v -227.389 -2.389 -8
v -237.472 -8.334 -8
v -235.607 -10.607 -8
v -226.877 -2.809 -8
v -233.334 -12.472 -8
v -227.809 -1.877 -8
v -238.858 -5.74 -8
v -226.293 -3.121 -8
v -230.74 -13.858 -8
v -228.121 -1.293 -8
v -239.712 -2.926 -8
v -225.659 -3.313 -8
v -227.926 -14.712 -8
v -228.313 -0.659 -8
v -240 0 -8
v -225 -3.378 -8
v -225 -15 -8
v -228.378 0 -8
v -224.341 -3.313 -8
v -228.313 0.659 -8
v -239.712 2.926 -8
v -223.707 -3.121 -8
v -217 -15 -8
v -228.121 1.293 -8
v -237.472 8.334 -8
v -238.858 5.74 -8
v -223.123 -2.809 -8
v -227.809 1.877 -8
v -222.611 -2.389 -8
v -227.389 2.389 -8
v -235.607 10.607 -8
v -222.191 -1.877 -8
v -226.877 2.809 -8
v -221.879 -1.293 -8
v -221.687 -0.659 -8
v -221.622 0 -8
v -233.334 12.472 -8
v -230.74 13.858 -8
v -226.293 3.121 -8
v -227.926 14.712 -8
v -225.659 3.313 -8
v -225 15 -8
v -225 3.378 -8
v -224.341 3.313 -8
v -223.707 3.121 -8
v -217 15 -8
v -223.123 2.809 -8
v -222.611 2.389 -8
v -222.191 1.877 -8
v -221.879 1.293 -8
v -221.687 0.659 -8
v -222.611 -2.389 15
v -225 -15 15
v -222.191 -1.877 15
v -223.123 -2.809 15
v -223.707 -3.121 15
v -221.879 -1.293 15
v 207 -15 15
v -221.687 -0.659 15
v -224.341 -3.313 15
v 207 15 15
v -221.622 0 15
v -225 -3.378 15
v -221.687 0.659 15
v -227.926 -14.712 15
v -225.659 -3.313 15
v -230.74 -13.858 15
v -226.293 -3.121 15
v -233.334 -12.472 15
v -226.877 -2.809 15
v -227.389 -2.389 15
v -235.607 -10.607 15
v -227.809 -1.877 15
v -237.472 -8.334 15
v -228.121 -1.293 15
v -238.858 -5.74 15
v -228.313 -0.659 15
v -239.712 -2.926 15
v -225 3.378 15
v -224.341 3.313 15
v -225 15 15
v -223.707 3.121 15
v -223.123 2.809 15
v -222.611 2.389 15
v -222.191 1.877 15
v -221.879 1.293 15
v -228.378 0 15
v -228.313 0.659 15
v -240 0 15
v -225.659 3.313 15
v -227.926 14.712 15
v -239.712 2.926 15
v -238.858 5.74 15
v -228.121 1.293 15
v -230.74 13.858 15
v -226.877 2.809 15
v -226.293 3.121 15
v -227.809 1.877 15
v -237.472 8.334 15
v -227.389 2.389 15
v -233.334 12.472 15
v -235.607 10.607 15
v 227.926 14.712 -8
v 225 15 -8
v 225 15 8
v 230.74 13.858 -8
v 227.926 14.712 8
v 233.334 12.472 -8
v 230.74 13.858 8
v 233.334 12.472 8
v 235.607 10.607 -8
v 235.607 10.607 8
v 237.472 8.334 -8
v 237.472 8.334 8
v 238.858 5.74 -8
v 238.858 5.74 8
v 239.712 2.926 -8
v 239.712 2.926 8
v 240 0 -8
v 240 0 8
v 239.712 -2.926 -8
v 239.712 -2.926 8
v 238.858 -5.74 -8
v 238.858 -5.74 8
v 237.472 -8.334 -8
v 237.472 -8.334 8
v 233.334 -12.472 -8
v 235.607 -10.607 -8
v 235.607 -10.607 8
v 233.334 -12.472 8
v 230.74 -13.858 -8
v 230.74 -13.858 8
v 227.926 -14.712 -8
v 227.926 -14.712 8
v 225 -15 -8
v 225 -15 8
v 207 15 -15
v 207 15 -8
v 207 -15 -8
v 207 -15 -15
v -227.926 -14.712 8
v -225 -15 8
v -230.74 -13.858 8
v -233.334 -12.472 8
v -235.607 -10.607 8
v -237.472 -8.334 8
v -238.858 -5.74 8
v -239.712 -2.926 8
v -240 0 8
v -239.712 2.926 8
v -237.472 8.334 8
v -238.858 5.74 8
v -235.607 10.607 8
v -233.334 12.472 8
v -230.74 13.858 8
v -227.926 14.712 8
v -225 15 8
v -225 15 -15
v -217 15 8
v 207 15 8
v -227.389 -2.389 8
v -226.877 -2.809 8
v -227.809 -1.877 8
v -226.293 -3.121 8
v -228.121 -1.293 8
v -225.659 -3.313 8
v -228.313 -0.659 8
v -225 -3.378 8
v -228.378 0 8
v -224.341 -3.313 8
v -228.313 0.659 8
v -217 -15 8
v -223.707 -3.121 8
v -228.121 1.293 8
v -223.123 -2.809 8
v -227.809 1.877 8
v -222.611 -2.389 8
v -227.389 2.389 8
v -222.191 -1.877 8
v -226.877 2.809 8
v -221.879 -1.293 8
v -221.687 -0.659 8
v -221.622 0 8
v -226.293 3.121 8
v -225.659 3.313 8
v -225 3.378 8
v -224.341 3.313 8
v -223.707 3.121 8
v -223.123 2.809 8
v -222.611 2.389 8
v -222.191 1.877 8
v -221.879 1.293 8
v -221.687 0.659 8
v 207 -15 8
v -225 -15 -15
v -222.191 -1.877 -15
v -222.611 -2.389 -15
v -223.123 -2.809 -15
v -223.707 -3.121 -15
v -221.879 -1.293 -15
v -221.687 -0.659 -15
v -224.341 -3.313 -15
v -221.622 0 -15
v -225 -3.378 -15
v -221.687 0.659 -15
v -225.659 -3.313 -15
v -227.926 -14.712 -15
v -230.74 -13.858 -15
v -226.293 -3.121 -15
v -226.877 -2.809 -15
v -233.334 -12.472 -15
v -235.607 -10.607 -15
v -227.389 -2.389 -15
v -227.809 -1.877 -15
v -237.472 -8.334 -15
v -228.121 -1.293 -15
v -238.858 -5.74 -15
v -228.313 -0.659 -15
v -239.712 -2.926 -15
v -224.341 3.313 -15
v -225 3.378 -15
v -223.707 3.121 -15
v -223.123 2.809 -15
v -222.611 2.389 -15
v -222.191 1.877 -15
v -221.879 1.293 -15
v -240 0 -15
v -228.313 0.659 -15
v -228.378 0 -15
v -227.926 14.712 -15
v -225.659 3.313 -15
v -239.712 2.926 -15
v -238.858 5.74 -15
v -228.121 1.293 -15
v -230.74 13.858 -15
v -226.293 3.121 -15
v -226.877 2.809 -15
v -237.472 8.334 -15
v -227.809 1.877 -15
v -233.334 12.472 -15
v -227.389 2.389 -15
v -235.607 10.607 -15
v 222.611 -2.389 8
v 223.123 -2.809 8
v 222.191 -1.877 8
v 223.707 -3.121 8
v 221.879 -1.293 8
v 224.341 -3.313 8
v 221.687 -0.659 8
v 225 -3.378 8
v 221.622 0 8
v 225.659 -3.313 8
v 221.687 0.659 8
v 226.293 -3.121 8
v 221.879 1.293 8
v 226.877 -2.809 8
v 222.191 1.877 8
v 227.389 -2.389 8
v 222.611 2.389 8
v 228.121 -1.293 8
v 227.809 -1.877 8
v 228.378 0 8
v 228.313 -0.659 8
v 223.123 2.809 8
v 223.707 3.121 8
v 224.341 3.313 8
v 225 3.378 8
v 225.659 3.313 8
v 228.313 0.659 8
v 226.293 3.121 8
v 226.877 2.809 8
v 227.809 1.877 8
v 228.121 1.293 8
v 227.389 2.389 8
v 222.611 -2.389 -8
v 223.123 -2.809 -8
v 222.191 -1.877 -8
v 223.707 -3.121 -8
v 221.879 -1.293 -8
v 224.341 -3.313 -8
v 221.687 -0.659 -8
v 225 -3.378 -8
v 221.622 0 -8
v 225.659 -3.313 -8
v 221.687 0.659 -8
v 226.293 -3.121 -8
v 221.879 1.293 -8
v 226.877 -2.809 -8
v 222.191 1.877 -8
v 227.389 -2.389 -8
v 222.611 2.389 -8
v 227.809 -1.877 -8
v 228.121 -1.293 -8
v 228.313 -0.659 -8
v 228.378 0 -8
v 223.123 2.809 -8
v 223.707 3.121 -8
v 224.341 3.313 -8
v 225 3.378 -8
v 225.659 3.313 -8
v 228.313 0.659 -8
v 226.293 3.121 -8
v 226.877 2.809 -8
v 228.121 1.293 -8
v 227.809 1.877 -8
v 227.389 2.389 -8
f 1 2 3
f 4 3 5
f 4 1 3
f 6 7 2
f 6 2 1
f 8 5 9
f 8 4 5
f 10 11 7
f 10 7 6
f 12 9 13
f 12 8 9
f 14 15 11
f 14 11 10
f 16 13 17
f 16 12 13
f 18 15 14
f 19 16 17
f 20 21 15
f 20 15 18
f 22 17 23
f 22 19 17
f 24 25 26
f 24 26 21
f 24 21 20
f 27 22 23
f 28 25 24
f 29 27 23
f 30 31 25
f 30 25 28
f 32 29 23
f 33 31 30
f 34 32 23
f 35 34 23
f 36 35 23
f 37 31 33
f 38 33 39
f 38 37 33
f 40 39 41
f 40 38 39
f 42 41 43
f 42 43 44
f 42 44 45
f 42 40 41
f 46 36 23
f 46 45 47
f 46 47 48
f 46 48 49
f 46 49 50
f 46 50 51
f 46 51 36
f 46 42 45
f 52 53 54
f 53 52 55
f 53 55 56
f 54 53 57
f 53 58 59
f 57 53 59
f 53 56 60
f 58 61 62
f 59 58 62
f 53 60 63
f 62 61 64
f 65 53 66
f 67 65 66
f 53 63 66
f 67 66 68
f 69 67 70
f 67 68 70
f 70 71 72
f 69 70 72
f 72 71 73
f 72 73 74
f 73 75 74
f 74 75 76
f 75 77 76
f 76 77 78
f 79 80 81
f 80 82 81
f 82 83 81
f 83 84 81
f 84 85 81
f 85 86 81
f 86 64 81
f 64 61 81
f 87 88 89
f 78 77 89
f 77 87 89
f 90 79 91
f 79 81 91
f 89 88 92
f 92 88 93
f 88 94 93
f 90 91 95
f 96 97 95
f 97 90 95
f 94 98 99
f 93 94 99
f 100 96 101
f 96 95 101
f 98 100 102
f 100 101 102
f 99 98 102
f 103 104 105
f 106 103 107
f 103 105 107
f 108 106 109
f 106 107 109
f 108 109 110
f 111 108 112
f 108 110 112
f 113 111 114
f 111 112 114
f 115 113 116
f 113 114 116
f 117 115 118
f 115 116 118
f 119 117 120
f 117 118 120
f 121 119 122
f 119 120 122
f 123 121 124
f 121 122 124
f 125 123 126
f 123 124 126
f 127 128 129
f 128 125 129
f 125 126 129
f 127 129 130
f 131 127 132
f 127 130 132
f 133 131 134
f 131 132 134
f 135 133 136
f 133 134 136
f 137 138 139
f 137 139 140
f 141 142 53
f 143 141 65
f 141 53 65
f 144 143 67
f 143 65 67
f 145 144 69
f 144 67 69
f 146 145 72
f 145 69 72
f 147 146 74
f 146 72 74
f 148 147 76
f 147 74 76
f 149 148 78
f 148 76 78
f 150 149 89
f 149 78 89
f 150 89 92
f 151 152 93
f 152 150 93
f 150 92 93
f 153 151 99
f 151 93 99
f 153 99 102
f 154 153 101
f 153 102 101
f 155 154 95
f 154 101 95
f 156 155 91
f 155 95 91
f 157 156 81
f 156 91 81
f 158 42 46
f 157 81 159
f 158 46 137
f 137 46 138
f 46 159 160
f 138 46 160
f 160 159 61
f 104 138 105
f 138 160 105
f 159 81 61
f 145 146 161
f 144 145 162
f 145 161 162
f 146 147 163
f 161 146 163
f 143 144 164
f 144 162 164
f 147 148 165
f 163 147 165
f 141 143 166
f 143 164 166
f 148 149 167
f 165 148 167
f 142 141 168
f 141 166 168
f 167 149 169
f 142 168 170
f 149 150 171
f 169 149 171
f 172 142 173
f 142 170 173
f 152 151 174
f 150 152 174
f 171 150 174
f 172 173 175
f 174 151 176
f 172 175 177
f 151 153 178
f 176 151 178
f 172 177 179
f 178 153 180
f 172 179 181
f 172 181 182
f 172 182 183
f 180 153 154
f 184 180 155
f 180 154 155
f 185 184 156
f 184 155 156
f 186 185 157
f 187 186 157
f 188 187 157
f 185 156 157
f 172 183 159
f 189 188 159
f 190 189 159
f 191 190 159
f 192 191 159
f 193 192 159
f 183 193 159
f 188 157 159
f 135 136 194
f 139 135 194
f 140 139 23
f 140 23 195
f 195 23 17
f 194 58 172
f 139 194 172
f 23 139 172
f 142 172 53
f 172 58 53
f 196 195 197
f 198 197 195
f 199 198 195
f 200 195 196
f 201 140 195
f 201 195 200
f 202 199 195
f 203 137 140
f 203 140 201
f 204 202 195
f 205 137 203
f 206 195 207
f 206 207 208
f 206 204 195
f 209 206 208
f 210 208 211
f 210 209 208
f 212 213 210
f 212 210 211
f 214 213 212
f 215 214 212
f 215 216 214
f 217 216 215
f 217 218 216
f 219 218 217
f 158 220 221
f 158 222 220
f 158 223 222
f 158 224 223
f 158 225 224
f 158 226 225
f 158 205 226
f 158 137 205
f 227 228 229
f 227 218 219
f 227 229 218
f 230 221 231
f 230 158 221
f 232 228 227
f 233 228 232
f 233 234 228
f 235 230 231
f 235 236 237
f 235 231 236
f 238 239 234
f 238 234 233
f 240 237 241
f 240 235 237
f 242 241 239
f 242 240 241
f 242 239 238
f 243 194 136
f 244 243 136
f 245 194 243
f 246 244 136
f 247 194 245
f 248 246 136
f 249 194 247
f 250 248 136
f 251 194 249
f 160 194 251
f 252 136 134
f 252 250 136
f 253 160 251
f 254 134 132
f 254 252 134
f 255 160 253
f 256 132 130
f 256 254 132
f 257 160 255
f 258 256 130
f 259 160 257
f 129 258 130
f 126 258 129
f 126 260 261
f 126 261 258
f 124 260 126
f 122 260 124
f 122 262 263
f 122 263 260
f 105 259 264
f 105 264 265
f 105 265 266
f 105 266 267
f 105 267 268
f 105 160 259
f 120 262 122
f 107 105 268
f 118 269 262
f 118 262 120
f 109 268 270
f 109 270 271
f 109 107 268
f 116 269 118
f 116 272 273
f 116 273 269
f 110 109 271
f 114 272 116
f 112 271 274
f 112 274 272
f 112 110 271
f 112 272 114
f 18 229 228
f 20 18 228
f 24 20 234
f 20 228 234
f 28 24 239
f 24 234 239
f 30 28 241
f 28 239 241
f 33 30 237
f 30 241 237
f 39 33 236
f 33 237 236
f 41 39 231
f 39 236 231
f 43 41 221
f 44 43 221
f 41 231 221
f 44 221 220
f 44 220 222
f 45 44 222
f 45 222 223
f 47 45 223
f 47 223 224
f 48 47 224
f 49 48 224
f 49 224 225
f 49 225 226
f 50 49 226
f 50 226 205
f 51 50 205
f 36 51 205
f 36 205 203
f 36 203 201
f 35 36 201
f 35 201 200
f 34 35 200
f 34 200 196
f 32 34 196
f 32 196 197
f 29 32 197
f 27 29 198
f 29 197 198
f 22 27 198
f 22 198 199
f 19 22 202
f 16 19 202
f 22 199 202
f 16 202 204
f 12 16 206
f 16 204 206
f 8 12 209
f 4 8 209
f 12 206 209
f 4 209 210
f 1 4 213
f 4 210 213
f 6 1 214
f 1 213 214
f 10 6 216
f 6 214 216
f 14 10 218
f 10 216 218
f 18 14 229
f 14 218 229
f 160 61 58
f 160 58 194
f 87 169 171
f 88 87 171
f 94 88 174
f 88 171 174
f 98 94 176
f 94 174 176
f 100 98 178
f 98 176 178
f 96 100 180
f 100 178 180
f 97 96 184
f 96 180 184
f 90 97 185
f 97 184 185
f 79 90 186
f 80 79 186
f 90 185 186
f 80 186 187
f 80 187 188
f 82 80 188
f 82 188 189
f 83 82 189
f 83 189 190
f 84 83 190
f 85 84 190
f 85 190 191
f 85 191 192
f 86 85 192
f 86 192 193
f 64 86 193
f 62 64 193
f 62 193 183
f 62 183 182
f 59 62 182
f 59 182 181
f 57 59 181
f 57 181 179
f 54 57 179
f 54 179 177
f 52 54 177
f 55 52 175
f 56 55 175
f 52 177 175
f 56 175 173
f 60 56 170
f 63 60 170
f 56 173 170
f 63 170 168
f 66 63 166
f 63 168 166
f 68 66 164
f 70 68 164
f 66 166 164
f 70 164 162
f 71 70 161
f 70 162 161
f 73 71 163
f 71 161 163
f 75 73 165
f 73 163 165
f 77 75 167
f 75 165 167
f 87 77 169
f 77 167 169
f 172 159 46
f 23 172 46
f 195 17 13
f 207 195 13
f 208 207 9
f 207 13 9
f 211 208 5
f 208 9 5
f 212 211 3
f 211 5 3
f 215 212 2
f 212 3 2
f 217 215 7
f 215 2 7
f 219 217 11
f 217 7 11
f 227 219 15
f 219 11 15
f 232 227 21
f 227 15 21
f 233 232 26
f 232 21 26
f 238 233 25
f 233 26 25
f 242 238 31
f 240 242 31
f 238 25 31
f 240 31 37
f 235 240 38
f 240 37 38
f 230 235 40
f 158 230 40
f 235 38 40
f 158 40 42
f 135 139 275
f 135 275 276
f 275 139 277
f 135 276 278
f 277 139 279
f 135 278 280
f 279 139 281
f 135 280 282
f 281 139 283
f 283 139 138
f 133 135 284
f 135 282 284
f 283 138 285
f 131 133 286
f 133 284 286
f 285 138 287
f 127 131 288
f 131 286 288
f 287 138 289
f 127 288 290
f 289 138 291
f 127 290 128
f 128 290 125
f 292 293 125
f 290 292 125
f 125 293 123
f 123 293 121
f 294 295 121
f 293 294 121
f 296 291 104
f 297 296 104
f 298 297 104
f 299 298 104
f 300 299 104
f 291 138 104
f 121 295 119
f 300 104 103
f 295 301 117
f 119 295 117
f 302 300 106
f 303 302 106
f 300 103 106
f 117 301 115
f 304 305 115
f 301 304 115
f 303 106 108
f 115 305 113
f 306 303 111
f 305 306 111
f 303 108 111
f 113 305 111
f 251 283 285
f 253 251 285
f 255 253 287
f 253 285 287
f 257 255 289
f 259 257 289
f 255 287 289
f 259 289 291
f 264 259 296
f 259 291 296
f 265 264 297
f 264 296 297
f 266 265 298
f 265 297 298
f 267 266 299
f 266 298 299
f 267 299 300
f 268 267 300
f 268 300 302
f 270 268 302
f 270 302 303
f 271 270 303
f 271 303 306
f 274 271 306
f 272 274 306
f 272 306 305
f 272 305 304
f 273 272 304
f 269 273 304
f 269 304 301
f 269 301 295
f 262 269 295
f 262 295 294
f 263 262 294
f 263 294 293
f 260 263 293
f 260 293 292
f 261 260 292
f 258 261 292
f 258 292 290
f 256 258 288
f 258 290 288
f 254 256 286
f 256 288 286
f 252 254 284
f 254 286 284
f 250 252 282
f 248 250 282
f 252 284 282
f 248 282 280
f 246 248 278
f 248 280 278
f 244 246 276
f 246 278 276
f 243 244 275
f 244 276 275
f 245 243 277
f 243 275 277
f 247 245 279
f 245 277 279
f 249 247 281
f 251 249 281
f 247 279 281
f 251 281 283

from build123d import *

# Parameters (mm, degrees)
BOSS_EXTRUDE1_DEPTH      = 15
H_0_266_DIAMETER_HOLE1_D = 6.7564
SKETCH5_W                = 40
SKETCH5_H                = 16
SKETCH5_H_2              = 20.916111238
CUT_EXTRUDE1_DEPTH       = 243.332416321


with BuildPart() as part:
    # Sketch1 → Boss-Extrude1 (new, symmetric)
    with BuildSketch(Plane.XY):
        with BuildLine():
            Line((-225, 15), (225, 15))
            ThreePointArc((225, 15), (240, 0), (225, -15))
            Line((225, -15), (-225, -15))
            ThreePointArc((-225, -15), (-240, 0), (-225, 15))
        make_face()
    extrude(amount=BOSS_EXTRUDE1_DEPTH, both=True)

    # H (0.266) Diameter Hole1 (through all)
    with Locations(Plane.XY.offset(15)):
        with Locations((-225, 0), (225, 0)):
            Hole(H_0_266_DIAMETER_HOLE1_D / 2)

    # Sketch5 → Cut-Extrude1 (cut, through all)
    with BuildSketch(Plane(origin=(0, 15, 0), x_dir=(1, 0, 0), z_dir=(0, 1, 0))):
        with Locations((-237, 0)):
            Rectangle(SKETCH5_W, SKETCH5_H)
        with Locations((227, 18.458055619)):
            Rectangle(SKETCH5_W, SKETCH5_H_2)
        with Locations((227, -18.458055619)):
            Rectangle(SKETCH5_W, SKETCH5_H_2)
    extrude(amount=-CUT_EXTRUDE1_DEPTH, mode=Mode.SUBTRACT)


solid = part.part
